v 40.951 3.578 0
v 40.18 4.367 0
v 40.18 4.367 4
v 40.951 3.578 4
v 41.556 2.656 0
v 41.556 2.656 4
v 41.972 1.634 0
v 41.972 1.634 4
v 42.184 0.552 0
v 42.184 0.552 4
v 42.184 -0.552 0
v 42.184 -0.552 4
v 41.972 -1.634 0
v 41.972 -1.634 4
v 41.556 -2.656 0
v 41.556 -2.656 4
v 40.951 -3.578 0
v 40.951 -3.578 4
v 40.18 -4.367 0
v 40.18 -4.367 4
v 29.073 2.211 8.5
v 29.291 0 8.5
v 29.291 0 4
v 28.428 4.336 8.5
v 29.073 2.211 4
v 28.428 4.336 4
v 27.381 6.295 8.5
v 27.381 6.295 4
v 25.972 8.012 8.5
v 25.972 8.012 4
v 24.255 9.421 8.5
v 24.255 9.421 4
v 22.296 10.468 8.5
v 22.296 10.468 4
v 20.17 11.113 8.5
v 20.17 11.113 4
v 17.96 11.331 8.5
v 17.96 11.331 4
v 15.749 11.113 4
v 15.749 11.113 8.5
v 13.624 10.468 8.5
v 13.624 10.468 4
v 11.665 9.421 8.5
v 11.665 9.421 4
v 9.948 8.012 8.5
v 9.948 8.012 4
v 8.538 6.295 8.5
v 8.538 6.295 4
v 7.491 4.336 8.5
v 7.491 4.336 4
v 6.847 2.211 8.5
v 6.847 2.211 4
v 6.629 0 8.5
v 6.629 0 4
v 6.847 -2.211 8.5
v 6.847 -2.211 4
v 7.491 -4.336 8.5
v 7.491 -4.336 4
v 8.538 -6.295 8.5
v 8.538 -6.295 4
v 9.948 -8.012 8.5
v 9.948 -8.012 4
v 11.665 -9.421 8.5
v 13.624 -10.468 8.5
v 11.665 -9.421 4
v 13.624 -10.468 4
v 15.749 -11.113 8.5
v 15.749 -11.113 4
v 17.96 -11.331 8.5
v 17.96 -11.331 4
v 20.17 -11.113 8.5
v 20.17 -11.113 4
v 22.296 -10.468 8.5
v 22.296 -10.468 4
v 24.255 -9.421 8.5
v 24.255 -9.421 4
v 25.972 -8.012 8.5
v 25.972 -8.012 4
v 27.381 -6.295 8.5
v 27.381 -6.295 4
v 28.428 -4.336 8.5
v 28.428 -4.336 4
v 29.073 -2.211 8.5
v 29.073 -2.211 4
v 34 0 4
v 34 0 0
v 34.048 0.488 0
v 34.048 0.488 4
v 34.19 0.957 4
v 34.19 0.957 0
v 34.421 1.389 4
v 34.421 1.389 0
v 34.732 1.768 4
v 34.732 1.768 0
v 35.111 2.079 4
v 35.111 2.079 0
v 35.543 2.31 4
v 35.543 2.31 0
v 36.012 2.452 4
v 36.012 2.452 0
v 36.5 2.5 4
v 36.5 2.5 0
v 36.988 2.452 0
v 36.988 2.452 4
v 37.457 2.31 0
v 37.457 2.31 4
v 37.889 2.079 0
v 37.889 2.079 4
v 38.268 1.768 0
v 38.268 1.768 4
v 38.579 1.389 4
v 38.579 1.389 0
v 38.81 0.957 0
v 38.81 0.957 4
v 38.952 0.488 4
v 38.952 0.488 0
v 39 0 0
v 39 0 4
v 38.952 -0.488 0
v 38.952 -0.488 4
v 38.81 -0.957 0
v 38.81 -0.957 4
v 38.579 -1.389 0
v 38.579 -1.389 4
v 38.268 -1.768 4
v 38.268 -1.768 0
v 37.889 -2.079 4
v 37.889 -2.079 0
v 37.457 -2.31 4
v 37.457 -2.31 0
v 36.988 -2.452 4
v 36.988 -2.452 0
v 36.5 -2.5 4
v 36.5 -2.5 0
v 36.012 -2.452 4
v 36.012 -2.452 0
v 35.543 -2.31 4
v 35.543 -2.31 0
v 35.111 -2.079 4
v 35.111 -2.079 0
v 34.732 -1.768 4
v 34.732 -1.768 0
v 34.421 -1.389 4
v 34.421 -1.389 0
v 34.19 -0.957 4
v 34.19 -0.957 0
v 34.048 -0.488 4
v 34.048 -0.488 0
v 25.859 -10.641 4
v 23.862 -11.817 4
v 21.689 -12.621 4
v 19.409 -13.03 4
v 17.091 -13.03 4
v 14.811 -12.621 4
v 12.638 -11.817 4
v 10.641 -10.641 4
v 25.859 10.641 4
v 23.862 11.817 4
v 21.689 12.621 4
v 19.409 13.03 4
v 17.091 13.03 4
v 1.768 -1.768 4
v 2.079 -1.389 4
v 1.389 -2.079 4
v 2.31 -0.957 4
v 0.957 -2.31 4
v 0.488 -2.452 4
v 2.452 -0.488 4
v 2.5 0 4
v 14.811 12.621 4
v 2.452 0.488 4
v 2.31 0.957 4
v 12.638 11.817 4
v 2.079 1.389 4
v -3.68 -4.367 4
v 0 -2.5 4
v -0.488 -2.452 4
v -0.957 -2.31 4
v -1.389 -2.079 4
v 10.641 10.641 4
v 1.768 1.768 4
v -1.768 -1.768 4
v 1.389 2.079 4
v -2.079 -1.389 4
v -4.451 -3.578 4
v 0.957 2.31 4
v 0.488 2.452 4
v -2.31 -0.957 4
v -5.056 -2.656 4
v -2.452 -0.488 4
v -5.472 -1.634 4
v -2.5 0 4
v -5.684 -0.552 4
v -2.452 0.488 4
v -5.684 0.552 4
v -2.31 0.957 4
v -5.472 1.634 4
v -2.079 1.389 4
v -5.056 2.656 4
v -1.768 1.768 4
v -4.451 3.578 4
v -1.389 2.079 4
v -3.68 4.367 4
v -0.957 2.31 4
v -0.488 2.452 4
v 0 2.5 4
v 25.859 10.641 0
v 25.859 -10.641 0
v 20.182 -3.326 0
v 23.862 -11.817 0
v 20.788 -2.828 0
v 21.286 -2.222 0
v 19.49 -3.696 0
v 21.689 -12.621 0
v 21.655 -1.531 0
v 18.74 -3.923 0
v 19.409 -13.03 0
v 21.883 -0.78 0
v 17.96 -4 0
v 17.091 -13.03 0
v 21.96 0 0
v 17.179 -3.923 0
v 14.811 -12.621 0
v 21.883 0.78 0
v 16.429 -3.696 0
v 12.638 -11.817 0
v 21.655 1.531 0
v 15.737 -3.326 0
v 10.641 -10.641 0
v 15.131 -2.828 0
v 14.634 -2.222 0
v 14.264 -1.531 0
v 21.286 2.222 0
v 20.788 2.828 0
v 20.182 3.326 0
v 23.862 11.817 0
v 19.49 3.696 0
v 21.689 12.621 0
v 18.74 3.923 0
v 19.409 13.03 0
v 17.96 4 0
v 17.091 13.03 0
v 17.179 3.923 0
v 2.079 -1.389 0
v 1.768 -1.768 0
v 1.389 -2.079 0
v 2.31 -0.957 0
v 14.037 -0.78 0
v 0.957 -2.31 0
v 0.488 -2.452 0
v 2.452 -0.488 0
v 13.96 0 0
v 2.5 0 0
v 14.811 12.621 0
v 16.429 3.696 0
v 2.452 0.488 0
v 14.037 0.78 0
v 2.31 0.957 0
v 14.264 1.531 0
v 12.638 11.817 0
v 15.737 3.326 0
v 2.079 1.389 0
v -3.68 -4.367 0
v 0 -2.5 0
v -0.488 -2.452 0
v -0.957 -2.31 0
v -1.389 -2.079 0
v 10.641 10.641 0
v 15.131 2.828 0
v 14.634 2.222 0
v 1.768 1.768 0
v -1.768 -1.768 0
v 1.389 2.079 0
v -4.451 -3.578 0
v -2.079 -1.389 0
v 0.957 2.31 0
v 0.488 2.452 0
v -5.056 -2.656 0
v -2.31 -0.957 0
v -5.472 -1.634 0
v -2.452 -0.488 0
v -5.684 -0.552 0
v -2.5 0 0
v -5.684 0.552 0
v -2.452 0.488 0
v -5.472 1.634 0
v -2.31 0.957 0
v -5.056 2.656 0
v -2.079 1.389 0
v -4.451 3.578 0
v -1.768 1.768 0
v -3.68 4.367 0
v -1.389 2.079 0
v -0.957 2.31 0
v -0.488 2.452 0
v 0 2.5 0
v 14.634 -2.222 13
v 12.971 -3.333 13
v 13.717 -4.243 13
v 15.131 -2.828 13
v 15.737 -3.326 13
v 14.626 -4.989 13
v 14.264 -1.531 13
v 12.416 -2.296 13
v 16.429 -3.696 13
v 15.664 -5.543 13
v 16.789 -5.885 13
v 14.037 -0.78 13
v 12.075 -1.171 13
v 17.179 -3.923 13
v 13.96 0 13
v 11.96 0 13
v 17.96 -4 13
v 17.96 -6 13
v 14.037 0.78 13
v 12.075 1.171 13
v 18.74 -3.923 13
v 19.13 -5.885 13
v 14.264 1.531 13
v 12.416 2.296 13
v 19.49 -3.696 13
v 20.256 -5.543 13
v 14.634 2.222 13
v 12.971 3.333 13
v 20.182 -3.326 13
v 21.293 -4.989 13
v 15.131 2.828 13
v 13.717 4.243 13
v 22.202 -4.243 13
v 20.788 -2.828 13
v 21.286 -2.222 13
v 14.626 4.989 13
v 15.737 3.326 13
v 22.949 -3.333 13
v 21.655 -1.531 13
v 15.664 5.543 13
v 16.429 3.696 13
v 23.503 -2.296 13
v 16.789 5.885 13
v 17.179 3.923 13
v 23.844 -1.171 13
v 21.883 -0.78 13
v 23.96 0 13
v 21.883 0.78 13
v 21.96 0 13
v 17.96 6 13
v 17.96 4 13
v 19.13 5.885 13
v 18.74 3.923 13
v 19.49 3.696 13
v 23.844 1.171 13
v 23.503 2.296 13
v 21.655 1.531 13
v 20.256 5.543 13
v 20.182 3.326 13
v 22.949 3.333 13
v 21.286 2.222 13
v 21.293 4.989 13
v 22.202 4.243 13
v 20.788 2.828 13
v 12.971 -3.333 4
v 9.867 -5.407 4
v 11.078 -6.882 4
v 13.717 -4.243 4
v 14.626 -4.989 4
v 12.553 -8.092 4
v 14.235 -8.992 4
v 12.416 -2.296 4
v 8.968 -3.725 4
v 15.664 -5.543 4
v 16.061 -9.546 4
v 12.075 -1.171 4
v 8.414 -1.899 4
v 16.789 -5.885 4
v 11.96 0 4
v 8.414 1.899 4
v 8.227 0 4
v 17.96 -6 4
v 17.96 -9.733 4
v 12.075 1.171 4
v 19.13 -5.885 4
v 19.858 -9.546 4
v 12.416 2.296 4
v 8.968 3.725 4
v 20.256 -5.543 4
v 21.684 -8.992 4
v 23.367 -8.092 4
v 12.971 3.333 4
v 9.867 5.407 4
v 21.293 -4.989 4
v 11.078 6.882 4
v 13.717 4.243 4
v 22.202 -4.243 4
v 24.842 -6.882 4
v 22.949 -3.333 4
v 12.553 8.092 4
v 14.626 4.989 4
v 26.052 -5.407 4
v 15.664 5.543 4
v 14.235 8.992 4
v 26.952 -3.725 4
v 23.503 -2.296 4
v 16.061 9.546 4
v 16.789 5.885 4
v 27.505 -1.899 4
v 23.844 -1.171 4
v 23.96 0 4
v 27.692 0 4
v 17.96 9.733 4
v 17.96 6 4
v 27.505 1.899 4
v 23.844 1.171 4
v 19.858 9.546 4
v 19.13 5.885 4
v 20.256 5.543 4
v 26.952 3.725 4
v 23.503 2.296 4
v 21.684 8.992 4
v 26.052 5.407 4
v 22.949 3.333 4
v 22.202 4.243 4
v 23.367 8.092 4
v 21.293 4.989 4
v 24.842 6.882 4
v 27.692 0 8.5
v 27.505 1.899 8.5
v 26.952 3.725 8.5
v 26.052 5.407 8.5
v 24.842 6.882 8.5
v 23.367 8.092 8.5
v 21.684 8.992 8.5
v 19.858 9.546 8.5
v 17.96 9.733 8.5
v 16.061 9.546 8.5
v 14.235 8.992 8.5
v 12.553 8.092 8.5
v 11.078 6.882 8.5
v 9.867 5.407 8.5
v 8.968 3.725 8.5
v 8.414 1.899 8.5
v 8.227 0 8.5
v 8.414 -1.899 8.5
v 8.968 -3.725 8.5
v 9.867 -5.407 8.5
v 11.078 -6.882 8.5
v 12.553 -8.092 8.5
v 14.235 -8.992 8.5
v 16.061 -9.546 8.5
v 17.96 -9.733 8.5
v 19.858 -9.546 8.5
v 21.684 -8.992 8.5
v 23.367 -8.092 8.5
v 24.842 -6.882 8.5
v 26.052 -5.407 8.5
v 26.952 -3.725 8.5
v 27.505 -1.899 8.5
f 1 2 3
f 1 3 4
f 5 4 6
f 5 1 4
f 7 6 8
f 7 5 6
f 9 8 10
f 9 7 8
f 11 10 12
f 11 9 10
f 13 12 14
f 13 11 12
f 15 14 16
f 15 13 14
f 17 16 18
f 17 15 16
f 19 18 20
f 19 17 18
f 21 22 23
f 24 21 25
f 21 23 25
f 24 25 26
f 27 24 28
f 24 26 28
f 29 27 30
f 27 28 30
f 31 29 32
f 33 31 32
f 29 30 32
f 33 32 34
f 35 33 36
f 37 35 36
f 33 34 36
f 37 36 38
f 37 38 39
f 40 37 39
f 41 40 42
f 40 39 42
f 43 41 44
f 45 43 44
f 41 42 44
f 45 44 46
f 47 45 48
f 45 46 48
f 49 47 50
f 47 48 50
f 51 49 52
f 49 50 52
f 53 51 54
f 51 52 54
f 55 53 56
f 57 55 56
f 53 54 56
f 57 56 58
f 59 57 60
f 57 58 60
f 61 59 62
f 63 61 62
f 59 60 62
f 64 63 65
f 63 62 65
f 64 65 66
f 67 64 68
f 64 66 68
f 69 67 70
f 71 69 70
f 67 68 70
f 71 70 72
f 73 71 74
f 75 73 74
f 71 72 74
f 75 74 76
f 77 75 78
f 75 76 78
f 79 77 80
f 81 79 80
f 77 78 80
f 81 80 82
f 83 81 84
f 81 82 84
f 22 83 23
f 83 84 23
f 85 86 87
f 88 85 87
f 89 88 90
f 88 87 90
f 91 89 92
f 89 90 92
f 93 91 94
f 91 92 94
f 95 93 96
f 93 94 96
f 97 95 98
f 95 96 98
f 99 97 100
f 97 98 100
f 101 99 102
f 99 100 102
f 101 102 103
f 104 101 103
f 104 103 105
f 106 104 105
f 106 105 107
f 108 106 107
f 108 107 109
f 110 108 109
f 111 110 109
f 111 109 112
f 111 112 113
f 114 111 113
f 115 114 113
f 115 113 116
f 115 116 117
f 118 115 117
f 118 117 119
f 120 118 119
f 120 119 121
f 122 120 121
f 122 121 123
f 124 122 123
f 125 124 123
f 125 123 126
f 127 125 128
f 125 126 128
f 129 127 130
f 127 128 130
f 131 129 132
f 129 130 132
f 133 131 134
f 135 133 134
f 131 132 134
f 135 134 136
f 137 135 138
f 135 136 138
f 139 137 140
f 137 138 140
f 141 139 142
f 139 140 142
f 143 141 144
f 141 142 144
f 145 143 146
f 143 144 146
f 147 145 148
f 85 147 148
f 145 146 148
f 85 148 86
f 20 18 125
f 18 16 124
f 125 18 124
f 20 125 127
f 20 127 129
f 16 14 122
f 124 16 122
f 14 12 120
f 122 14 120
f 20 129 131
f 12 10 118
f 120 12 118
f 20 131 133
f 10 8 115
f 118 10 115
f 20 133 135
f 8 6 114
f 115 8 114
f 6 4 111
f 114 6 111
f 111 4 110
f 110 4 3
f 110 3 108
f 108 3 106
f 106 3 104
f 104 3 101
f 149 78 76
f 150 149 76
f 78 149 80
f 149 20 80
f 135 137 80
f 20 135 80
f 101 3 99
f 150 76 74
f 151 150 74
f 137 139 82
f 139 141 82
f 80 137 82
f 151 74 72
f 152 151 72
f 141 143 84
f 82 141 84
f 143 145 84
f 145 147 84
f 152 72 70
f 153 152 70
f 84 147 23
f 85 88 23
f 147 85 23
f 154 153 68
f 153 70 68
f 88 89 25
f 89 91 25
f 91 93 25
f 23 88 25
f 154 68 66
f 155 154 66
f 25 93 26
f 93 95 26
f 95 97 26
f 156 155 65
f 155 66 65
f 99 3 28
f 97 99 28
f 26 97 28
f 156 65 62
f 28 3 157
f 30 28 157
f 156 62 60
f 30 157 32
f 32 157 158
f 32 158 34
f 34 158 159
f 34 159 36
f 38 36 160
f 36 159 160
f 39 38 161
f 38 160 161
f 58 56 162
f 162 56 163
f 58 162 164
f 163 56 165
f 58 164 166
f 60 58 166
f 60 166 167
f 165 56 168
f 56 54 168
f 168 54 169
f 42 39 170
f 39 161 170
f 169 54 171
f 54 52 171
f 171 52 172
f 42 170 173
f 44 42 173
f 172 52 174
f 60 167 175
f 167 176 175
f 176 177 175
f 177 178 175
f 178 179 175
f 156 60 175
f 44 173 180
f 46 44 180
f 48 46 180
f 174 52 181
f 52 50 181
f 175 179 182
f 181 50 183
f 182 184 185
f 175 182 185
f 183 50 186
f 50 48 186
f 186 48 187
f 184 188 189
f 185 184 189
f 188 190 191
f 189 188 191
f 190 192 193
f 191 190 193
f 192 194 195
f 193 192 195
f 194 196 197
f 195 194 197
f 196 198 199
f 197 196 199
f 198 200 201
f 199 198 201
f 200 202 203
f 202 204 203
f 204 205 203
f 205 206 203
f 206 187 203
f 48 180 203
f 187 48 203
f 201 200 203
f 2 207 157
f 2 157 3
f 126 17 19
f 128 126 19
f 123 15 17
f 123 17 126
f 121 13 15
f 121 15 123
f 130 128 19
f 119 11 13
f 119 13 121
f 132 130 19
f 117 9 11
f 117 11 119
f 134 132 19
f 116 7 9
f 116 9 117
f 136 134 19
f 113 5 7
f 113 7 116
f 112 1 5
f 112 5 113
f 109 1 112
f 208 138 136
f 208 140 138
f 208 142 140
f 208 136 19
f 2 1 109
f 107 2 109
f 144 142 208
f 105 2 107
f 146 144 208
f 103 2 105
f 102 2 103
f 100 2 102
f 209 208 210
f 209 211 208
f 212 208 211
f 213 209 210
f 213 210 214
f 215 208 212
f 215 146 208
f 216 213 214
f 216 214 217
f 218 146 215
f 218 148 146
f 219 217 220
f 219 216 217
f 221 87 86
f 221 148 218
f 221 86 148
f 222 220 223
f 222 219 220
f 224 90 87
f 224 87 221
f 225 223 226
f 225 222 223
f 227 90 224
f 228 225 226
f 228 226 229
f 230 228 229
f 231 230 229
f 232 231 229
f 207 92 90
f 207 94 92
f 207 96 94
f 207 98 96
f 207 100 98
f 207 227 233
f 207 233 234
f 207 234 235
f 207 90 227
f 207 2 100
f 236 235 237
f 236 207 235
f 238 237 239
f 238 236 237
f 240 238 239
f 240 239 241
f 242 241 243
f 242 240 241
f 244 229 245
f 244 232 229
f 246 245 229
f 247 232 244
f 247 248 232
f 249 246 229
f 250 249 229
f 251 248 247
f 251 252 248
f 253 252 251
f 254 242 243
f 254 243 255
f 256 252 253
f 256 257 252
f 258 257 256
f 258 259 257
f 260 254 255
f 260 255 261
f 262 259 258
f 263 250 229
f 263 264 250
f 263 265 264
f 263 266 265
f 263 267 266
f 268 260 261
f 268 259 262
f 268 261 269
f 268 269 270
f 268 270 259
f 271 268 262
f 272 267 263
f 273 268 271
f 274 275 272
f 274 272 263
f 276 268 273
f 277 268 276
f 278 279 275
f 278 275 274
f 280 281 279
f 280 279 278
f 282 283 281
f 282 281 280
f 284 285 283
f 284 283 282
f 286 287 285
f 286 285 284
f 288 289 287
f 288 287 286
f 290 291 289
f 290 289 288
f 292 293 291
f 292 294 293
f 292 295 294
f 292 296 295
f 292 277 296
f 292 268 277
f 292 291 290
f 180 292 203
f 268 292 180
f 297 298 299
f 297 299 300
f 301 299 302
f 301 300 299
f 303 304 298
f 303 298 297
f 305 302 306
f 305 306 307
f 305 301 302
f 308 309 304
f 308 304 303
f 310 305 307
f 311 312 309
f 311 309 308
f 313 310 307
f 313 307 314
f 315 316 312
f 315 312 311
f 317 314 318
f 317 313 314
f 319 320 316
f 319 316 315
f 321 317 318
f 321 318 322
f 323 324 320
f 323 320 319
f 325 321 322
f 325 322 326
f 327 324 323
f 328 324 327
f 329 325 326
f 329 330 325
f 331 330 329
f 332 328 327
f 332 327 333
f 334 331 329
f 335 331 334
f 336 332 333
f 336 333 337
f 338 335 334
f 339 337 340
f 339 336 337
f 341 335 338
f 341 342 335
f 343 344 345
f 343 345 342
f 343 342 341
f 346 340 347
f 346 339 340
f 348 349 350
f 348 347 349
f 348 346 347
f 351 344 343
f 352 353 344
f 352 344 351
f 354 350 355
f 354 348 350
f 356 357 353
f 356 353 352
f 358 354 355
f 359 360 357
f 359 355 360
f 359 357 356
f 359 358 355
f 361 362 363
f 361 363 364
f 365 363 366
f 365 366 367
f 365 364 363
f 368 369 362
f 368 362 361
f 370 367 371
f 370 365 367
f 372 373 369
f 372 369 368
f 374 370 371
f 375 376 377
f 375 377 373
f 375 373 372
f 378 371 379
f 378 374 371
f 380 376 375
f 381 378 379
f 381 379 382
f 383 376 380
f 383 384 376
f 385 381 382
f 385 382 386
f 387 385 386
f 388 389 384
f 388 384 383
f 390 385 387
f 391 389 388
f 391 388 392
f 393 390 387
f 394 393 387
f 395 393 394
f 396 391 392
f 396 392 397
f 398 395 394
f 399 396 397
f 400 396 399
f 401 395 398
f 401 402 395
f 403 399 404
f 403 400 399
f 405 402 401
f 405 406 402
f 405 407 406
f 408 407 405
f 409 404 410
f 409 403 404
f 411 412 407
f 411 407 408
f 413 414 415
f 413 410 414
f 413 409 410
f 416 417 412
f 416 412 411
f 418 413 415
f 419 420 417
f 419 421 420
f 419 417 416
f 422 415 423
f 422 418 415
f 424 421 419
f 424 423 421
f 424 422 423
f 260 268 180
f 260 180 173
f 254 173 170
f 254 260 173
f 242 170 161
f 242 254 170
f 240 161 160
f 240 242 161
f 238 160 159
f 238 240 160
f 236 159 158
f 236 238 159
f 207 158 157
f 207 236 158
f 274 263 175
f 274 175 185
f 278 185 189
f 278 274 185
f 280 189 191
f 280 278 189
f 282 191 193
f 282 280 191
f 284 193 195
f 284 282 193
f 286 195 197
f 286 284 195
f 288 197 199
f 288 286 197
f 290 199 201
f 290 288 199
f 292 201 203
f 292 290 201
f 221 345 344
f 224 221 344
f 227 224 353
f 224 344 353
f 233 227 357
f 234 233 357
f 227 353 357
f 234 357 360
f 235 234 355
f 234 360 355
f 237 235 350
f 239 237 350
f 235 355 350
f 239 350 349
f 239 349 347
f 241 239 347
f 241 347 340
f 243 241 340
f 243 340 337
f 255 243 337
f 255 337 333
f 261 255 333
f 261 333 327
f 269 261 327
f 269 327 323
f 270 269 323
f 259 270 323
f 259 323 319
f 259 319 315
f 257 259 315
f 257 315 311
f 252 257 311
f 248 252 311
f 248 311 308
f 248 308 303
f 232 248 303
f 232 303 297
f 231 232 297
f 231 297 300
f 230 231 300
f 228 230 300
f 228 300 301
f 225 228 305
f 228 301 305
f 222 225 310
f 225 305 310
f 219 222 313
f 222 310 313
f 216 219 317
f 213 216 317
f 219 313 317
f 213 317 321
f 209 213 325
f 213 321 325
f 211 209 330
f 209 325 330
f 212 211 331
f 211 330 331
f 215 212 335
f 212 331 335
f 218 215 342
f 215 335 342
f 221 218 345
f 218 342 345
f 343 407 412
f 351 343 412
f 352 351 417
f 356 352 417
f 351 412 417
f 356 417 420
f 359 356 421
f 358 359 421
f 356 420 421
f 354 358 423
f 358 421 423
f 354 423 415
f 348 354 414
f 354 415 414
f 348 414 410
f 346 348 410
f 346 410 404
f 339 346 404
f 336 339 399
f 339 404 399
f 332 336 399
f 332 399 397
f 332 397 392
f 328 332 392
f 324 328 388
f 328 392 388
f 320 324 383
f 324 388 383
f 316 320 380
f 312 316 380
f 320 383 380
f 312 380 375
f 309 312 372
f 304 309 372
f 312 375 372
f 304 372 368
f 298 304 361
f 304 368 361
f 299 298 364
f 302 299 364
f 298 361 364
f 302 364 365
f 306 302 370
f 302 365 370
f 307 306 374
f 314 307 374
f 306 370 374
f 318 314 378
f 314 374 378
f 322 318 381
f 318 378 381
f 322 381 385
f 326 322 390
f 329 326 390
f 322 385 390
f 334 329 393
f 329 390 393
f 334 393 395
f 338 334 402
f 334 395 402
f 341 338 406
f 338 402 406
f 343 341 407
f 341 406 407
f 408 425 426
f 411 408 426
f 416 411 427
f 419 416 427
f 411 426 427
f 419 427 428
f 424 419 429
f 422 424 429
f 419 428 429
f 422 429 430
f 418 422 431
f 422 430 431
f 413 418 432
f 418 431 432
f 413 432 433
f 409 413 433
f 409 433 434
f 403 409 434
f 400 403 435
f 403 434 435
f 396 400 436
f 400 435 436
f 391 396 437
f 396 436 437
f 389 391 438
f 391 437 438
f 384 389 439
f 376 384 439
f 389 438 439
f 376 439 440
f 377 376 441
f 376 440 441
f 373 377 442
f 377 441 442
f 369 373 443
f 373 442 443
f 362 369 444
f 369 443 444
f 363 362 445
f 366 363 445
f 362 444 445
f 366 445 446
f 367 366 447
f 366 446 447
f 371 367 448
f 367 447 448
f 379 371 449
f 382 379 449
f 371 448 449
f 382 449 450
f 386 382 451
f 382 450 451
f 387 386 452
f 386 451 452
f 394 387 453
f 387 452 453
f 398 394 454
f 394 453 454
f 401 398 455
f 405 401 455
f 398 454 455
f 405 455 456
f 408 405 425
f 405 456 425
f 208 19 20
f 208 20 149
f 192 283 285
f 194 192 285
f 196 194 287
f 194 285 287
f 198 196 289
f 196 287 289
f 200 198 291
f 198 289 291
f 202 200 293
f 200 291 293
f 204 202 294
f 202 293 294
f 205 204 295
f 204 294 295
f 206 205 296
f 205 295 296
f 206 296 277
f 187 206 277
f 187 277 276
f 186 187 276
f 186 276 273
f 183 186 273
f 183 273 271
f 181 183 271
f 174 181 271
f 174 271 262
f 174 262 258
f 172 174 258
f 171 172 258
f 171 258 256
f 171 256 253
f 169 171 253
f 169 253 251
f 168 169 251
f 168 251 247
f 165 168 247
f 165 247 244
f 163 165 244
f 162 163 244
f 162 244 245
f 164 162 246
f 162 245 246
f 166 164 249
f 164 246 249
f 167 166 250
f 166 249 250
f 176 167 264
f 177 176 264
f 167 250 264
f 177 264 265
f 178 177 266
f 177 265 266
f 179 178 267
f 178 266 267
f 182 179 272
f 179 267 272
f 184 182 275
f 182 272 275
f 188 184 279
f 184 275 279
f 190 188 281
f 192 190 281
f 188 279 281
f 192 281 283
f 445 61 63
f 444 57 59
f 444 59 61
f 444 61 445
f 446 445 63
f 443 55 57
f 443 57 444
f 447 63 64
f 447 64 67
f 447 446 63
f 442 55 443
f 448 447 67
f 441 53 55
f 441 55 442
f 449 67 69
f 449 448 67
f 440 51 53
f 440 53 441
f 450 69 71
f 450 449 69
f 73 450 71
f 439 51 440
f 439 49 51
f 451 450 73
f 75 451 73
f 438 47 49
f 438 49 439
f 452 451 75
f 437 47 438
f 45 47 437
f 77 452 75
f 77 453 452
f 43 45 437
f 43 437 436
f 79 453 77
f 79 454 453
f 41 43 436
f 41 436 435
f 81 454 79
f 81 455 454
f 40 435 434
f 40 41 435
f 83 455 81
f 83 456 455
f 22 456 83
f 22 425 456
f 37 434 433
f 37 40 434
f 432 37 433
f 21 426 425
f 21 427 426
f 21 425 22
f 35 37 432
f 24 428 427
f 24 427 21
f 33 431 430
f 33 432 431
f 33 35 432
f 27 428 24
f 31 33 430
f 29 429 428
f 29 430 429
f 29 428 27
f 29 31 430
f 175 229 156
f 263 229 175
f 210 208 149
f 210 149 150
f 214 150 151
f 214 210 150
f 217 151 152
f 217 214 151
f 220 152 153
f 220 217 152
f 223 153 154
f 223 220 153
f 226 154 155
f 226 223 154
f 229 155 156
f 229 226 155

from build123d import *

# Parameters (mm, degrees)
EXTRUDE_1_DEPTH       = 4
HOLE_WIZARD_5_0_5_1_D = 5
SKETCH_4_R            = 11.330923122
EXTRUDE_2_DEPTH       = 4.5
SKETCH_5_R            = 9.73271474
CUT_EXTRUDE_1_DEPTH   = 4.5
SKETCH_6_R            = 6
EXTRUDE_3_DEPTH       = 9
SKETCH_7_R            = 4
CUT_EXTRUDE_2_DEPTH   = 47.064049502


with BuildPart() as part:
    # 草图1 → 凸台-拉伸1 (new body)
    with BuildSketch(Plane.XY):
        with BuildLine():
            Line((-3.679866613, 4.367396682), (10.641275218, 10.64119661))
            ThreePointArc((10.641275218, 10.64119661), (18.25, 13.081580872), (25.858724782, 10.64119661))
            Line((25.858724782, 10.64119661), (40.179866613, 4.367396682))
            ThreePointArc((40.179866613, 4.367396682), (42.21100447, 0), (40.179866613, -4.367396682))
            Line((40.179866613, -4.367396682), (25.858724782, -10.64119661))
            ThreePointArc((25.858724782, -10.64119661), (18.25, -13.081580872), (10.641275218, -10.64119661))
            Line((10.641275218, -10.64119661), (-3.679866613, -4.367396682))
            ThreePointArc((-3.679866613, -4.367396682), (-5.71100447, 0), (-3.679866613, 4.367396682))
        make_face()
    extrude(amount=EXTRUDE_1_DEPTH)

    # Ø5.0 (5) 直径孔1 (through all)
    with Locations(Plane.XY.offset(4)):
        with Locations((0, 0), (36.5, 0)):
            Hole(HOLE_WIZARD_5_0_5_1_D / 2)

    # 草图4 → 凸台-拉伸2 (add)
    with BuildSketch(Plane.XY.offset(4)):
        with Locations((17.959725488, 0)):
            Circle(SKETCH_4_R)
    extrude(amount=EXTRUDE_2_DEPTH)

    # 草图5 → 切除-拉伸1 (cut)
    with BuildSketch(Plane.XY.offset(8.5)):
        with Locations((17.959725488, 0)):
            Circle(SKETCH_5_R)
    extrude(amount=-CUT_EXTRUDE_1_DEPTH, mode=Mode.SUBTRACT)

    # 草图6 → 凸台-拉伸3 (add)
    with BuildSketch(Plane.XY.offset(4)):
        with Locations((17.959725488, 0)):
            Circle(SKETCH_6_R)
    extrude(amount=EXTRUDE_3_DEPTH)

    # 草图7 → 切除-拉伸2 (cut, through all)
    with BuildSketch(Plane.XY.offset(13)):
        with Locations((17.959725488, 0)):
            Circle(SKETCH_7_R)
    extrude(amount=-CUT_EXTRUDE_2_DEPTH, mode=Mode.SUBTRACT)


solid = part.part
